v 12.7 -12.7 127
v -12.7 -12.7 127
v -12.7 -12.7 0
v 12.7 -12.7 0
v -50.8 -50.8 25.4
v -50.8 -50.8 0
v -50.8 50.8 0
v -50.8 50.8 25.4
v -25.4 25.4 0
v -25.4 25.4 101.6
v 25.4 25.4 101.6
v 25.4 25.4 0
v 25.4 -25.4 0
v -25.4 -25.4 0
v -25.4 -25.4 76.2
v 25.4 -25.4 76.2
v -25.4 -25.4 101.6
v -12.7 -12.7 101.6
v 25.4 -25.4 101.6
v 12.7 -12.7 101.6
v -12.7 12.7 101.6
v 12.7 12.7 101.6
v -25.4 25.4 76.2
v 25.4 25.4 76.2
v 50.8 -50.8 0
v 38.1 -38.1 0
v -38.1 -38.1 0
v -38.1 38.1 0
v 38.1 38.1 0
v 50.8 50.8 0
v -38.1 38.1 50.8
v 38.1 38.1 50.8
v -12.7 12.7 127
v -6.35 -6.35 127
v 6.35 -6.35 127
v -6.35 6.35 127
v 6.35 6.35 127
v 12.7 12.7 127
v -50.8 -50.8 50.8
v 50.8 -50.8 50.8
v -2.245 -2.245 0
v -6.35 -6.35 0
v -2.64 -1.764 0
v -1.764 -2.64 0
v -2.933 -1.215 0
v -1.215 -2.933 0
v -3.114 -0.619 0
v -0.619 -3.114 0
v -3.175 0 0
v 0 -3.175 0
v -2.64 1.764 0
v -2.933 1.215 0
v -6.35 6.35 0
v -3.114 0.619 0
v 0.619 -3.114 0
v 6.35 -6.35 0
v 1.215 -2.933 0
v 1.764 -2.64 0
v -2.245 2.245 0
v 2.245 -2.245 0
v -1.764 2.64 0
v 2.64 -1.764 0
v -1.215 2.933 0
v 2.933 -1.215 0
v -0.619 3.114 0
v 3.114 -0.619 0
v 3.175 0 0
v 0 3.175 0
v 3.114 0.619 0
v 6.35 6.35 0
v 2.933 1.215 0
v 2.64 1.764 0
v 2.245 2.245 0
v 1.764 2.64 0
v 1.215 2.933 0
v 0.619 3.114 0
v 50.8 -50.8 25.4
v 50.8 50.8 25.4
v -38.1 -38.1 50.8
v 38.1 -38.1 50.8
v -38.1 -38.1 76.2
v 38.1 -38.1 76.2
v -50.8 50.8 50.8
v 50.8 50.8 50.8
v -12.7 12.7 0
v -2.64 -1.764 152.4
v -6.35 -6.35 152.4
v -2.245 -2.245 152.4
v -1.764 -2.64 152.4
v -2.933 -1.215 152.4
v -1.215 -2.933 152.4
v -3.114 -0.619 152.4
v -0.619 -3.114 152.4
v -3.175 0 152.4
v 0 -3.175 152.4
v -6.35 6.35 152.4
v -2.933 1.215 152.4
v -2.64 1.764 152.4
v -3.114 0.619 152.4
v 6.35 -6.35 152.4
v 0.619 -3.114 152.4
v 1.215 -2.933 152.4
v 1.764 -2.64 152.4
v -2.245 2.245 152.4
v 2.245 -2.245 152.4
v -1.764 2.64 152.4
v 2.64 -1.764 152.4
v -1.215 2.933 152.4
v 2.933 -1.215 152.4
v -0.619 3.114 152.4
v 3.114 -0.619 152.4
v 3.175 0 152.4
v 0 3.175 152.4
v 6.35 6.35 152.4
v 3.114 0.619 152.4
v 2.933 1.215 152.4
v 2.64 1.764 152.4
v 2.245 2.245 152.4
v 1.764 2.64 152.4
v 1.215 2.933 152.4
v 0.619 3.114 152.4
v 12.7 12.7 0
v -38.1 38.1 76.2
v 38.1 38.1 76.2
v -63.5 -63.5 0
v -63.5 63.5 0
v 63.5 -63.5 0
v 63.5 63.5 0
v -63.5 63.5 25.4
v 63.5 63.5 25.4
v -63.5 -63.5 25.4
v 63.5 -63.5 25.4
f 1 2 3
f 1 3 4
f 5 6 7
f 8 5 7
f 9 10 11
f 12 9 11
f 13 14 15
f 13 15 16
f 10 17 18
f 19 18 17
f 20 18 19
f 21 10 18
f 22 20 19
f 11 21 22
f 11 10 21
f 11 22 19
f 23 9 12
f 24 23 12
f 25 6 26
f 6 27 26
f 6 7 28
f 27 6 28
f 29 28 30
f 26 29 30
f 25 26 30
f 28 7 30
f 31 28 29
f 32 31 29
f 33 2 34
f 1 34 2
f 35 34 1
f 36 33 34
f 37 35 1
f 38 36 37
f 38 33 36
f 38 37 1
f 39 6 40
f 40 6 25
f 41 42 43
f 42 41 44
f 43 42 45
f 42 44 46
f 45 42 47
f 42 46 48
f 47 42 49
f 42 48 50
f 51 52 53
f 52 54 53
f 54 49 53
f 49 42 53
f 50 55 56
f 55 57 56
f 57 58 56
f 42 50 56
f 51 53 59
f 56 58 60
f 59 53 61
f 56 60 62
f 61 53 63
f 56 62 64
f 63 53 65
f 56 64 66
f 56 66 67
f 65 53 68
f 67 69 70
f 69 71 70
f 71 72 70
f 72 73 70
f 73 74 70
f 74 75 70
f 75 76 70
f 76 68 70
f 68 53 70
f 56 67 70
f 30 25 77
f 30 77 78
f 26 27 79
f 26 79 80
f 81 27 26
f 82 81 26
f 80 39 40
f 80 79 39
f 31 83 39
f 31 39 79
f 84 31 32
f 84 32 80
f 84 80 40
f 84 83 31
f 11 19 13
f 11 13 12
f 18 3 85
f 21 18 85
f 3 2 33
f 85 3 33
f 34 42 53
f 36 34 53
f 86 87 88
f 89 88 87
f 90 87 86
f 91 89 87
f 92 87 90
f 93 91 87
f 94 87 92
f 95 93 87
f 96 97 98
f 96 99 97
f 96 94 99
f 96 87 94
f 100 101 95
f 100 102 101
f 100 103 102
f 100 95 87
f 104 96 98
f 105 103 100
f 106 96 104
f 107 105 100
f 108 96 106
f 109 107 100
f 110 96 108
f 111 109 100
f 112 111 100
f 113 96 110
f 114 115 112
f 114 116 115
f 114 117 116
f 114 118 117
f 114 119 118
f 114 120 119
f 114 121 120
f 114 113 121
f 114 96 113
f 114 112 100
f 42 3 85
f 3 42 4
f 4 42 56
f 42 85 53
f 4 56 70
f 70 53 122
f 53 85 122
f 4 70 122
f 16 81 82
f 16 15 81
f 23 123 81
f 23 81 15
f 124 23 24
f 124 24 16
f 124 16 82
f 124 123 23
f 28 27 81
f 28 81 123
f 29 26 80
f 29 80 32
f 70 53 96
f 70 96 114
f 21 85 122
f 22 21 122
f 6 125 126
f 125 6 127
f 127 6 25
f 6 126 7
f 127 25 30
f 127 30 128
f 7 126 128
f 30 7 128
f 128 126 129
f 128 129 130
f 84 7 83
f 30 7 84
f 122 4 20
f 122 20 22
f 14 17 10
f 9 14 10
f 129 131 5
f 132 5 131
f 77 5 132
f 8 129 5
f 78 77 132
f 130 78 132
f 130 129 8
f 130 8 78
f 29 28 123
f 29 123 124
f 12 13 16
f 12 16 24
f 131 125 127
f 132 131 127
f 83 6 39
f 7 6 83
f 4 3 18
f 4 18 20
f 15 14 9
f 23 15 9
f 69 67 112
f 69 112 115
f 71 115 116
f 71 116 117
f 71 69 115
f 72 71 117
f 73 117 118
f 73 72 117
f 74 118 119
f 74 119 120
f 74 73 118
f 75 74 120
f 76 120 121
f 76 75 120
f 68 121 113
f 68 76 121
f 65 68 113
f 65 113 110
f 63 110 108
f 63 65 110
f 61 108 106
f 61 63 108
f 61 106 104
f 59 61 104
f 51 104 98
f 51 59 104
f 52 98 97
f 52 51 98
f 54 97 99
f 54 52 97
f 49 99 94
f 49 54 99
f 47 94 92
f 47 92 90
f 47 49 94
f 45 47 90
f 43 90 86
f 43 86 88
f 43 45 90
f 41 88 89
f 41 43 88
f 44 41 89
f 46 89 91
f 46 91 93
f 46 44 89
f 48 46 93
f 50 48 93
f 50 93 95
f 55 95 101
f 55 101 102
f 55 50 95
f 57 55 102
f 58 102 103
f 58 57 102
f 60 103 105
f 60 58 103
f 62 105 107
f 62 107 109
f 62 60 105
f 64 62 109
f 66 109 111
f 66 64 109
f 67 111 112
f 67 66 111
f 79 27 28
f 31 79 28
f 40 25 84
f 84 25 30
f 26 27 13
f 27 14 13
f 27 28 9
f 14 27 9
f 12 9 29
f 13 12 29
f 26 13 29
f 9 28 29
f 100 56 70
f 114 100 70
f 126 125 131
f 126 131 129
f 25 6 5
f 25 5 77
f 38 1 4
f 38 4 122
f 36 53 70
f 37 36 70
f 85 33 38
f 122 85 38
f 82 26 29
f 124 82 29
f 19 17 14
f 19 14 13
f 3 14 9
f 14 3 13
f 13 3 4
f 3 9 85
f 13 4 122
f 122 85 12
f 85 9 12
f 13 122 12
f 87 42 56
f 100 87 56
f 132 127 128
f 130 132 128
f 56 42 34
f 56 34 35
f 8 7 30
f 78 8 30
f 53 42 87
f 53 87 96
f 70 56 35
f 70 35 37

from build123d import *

# Parameters (mm, degrees)
F0_W     = 127
F0_H     = 127
F0_W_2   = 101.6
F0_H_2   = 101.6
F1_DEPTH = 25.4
F0_W_3   = 76.2
F0_H_3   = 76.2
F2_DEPTH = 50.8
F0_W_4   = 50.8
F0_H_4   = 50.8
F3_DEPTH = 76.2
F0_W_5   = 25.4
F0_H_5   = 25.4
F4_DEPTH = 101.6
F0_W_6   = 12.7
F0_H_6   = 12.7
F5_DEPTH = 127
F0_R     = 3.175
F6_DEPTH = 152.4


# Not quite as in the source:
# - the program builds the solid bodies; features that only make, move or delete a surface that nothing else refers to are left out


with BuildPart() as f1:
    # F0 (on Top) → F1 (new body)
    with BuildSketch(Plane.XY):
        Rectangle(F0_W, F0_H)
        Rectangle(F0_W_2, F0_H_2, mode=Mode.SUBTRACT)
    extrude(amount=F1_DEPTH)


with BuildPart() as f2:
    # F0 (on Top) → F2 (new body)
    with BuildSketch(Plane.XY):
        Rectangle(F0_W_2, F0_H_2)
        Rectangle(F0_W_3, F0_H_3, mode=Mode.SUBTRACT)
    extrude(amount=F2_DEPTH)


with BuildPart() as f3:
    # F0 (on Top) → F3 (new body)
    with BuildSketch(Plane.XY):
        Rectangle(F0_W_3, F0_H_3)
        Rectangle(F0_W_4, F0_H_4, mode=Mode.SUBTRACT)
    extrude(amount=F3_DEPTH)


with BuildPart() as f4:
    # F0 (on Top) → F4 (new body)
    with BuildSketch(Plane.XY):
        Rectangle(F0_W_4, F0_H_4)
        Rectangle(F0_W_5, F0_H_5, mode=Mode.SUBTRACT)
    extrude(amount=F4_DEPTH)


with BuildPart() as f5:
    # F0 (on Top) → F5 (new body)
    with BuildSketch(Plane.XY):
        Rectangle(F0_W_5, F0_H_5)
        Rectangle(F0_W_6, F0_H_6, mode=Mode.SUBTRACT)
    extrude(amount=F5_DEPTH)


with BuildPart() as f6:
    # F0 (on Top) → F6 (new body)
    with BuildSketch(Plane.XY):
        Rectangle(F0_W_6, F0_H_6)
        Circle(F0_R, mode=Mode.SUBTRACT)
    extrude(amount=F6_DEPTH)


solid = Compound([f1.part, f2.part, f3.part, f4.part, f5.part, f6.part])
